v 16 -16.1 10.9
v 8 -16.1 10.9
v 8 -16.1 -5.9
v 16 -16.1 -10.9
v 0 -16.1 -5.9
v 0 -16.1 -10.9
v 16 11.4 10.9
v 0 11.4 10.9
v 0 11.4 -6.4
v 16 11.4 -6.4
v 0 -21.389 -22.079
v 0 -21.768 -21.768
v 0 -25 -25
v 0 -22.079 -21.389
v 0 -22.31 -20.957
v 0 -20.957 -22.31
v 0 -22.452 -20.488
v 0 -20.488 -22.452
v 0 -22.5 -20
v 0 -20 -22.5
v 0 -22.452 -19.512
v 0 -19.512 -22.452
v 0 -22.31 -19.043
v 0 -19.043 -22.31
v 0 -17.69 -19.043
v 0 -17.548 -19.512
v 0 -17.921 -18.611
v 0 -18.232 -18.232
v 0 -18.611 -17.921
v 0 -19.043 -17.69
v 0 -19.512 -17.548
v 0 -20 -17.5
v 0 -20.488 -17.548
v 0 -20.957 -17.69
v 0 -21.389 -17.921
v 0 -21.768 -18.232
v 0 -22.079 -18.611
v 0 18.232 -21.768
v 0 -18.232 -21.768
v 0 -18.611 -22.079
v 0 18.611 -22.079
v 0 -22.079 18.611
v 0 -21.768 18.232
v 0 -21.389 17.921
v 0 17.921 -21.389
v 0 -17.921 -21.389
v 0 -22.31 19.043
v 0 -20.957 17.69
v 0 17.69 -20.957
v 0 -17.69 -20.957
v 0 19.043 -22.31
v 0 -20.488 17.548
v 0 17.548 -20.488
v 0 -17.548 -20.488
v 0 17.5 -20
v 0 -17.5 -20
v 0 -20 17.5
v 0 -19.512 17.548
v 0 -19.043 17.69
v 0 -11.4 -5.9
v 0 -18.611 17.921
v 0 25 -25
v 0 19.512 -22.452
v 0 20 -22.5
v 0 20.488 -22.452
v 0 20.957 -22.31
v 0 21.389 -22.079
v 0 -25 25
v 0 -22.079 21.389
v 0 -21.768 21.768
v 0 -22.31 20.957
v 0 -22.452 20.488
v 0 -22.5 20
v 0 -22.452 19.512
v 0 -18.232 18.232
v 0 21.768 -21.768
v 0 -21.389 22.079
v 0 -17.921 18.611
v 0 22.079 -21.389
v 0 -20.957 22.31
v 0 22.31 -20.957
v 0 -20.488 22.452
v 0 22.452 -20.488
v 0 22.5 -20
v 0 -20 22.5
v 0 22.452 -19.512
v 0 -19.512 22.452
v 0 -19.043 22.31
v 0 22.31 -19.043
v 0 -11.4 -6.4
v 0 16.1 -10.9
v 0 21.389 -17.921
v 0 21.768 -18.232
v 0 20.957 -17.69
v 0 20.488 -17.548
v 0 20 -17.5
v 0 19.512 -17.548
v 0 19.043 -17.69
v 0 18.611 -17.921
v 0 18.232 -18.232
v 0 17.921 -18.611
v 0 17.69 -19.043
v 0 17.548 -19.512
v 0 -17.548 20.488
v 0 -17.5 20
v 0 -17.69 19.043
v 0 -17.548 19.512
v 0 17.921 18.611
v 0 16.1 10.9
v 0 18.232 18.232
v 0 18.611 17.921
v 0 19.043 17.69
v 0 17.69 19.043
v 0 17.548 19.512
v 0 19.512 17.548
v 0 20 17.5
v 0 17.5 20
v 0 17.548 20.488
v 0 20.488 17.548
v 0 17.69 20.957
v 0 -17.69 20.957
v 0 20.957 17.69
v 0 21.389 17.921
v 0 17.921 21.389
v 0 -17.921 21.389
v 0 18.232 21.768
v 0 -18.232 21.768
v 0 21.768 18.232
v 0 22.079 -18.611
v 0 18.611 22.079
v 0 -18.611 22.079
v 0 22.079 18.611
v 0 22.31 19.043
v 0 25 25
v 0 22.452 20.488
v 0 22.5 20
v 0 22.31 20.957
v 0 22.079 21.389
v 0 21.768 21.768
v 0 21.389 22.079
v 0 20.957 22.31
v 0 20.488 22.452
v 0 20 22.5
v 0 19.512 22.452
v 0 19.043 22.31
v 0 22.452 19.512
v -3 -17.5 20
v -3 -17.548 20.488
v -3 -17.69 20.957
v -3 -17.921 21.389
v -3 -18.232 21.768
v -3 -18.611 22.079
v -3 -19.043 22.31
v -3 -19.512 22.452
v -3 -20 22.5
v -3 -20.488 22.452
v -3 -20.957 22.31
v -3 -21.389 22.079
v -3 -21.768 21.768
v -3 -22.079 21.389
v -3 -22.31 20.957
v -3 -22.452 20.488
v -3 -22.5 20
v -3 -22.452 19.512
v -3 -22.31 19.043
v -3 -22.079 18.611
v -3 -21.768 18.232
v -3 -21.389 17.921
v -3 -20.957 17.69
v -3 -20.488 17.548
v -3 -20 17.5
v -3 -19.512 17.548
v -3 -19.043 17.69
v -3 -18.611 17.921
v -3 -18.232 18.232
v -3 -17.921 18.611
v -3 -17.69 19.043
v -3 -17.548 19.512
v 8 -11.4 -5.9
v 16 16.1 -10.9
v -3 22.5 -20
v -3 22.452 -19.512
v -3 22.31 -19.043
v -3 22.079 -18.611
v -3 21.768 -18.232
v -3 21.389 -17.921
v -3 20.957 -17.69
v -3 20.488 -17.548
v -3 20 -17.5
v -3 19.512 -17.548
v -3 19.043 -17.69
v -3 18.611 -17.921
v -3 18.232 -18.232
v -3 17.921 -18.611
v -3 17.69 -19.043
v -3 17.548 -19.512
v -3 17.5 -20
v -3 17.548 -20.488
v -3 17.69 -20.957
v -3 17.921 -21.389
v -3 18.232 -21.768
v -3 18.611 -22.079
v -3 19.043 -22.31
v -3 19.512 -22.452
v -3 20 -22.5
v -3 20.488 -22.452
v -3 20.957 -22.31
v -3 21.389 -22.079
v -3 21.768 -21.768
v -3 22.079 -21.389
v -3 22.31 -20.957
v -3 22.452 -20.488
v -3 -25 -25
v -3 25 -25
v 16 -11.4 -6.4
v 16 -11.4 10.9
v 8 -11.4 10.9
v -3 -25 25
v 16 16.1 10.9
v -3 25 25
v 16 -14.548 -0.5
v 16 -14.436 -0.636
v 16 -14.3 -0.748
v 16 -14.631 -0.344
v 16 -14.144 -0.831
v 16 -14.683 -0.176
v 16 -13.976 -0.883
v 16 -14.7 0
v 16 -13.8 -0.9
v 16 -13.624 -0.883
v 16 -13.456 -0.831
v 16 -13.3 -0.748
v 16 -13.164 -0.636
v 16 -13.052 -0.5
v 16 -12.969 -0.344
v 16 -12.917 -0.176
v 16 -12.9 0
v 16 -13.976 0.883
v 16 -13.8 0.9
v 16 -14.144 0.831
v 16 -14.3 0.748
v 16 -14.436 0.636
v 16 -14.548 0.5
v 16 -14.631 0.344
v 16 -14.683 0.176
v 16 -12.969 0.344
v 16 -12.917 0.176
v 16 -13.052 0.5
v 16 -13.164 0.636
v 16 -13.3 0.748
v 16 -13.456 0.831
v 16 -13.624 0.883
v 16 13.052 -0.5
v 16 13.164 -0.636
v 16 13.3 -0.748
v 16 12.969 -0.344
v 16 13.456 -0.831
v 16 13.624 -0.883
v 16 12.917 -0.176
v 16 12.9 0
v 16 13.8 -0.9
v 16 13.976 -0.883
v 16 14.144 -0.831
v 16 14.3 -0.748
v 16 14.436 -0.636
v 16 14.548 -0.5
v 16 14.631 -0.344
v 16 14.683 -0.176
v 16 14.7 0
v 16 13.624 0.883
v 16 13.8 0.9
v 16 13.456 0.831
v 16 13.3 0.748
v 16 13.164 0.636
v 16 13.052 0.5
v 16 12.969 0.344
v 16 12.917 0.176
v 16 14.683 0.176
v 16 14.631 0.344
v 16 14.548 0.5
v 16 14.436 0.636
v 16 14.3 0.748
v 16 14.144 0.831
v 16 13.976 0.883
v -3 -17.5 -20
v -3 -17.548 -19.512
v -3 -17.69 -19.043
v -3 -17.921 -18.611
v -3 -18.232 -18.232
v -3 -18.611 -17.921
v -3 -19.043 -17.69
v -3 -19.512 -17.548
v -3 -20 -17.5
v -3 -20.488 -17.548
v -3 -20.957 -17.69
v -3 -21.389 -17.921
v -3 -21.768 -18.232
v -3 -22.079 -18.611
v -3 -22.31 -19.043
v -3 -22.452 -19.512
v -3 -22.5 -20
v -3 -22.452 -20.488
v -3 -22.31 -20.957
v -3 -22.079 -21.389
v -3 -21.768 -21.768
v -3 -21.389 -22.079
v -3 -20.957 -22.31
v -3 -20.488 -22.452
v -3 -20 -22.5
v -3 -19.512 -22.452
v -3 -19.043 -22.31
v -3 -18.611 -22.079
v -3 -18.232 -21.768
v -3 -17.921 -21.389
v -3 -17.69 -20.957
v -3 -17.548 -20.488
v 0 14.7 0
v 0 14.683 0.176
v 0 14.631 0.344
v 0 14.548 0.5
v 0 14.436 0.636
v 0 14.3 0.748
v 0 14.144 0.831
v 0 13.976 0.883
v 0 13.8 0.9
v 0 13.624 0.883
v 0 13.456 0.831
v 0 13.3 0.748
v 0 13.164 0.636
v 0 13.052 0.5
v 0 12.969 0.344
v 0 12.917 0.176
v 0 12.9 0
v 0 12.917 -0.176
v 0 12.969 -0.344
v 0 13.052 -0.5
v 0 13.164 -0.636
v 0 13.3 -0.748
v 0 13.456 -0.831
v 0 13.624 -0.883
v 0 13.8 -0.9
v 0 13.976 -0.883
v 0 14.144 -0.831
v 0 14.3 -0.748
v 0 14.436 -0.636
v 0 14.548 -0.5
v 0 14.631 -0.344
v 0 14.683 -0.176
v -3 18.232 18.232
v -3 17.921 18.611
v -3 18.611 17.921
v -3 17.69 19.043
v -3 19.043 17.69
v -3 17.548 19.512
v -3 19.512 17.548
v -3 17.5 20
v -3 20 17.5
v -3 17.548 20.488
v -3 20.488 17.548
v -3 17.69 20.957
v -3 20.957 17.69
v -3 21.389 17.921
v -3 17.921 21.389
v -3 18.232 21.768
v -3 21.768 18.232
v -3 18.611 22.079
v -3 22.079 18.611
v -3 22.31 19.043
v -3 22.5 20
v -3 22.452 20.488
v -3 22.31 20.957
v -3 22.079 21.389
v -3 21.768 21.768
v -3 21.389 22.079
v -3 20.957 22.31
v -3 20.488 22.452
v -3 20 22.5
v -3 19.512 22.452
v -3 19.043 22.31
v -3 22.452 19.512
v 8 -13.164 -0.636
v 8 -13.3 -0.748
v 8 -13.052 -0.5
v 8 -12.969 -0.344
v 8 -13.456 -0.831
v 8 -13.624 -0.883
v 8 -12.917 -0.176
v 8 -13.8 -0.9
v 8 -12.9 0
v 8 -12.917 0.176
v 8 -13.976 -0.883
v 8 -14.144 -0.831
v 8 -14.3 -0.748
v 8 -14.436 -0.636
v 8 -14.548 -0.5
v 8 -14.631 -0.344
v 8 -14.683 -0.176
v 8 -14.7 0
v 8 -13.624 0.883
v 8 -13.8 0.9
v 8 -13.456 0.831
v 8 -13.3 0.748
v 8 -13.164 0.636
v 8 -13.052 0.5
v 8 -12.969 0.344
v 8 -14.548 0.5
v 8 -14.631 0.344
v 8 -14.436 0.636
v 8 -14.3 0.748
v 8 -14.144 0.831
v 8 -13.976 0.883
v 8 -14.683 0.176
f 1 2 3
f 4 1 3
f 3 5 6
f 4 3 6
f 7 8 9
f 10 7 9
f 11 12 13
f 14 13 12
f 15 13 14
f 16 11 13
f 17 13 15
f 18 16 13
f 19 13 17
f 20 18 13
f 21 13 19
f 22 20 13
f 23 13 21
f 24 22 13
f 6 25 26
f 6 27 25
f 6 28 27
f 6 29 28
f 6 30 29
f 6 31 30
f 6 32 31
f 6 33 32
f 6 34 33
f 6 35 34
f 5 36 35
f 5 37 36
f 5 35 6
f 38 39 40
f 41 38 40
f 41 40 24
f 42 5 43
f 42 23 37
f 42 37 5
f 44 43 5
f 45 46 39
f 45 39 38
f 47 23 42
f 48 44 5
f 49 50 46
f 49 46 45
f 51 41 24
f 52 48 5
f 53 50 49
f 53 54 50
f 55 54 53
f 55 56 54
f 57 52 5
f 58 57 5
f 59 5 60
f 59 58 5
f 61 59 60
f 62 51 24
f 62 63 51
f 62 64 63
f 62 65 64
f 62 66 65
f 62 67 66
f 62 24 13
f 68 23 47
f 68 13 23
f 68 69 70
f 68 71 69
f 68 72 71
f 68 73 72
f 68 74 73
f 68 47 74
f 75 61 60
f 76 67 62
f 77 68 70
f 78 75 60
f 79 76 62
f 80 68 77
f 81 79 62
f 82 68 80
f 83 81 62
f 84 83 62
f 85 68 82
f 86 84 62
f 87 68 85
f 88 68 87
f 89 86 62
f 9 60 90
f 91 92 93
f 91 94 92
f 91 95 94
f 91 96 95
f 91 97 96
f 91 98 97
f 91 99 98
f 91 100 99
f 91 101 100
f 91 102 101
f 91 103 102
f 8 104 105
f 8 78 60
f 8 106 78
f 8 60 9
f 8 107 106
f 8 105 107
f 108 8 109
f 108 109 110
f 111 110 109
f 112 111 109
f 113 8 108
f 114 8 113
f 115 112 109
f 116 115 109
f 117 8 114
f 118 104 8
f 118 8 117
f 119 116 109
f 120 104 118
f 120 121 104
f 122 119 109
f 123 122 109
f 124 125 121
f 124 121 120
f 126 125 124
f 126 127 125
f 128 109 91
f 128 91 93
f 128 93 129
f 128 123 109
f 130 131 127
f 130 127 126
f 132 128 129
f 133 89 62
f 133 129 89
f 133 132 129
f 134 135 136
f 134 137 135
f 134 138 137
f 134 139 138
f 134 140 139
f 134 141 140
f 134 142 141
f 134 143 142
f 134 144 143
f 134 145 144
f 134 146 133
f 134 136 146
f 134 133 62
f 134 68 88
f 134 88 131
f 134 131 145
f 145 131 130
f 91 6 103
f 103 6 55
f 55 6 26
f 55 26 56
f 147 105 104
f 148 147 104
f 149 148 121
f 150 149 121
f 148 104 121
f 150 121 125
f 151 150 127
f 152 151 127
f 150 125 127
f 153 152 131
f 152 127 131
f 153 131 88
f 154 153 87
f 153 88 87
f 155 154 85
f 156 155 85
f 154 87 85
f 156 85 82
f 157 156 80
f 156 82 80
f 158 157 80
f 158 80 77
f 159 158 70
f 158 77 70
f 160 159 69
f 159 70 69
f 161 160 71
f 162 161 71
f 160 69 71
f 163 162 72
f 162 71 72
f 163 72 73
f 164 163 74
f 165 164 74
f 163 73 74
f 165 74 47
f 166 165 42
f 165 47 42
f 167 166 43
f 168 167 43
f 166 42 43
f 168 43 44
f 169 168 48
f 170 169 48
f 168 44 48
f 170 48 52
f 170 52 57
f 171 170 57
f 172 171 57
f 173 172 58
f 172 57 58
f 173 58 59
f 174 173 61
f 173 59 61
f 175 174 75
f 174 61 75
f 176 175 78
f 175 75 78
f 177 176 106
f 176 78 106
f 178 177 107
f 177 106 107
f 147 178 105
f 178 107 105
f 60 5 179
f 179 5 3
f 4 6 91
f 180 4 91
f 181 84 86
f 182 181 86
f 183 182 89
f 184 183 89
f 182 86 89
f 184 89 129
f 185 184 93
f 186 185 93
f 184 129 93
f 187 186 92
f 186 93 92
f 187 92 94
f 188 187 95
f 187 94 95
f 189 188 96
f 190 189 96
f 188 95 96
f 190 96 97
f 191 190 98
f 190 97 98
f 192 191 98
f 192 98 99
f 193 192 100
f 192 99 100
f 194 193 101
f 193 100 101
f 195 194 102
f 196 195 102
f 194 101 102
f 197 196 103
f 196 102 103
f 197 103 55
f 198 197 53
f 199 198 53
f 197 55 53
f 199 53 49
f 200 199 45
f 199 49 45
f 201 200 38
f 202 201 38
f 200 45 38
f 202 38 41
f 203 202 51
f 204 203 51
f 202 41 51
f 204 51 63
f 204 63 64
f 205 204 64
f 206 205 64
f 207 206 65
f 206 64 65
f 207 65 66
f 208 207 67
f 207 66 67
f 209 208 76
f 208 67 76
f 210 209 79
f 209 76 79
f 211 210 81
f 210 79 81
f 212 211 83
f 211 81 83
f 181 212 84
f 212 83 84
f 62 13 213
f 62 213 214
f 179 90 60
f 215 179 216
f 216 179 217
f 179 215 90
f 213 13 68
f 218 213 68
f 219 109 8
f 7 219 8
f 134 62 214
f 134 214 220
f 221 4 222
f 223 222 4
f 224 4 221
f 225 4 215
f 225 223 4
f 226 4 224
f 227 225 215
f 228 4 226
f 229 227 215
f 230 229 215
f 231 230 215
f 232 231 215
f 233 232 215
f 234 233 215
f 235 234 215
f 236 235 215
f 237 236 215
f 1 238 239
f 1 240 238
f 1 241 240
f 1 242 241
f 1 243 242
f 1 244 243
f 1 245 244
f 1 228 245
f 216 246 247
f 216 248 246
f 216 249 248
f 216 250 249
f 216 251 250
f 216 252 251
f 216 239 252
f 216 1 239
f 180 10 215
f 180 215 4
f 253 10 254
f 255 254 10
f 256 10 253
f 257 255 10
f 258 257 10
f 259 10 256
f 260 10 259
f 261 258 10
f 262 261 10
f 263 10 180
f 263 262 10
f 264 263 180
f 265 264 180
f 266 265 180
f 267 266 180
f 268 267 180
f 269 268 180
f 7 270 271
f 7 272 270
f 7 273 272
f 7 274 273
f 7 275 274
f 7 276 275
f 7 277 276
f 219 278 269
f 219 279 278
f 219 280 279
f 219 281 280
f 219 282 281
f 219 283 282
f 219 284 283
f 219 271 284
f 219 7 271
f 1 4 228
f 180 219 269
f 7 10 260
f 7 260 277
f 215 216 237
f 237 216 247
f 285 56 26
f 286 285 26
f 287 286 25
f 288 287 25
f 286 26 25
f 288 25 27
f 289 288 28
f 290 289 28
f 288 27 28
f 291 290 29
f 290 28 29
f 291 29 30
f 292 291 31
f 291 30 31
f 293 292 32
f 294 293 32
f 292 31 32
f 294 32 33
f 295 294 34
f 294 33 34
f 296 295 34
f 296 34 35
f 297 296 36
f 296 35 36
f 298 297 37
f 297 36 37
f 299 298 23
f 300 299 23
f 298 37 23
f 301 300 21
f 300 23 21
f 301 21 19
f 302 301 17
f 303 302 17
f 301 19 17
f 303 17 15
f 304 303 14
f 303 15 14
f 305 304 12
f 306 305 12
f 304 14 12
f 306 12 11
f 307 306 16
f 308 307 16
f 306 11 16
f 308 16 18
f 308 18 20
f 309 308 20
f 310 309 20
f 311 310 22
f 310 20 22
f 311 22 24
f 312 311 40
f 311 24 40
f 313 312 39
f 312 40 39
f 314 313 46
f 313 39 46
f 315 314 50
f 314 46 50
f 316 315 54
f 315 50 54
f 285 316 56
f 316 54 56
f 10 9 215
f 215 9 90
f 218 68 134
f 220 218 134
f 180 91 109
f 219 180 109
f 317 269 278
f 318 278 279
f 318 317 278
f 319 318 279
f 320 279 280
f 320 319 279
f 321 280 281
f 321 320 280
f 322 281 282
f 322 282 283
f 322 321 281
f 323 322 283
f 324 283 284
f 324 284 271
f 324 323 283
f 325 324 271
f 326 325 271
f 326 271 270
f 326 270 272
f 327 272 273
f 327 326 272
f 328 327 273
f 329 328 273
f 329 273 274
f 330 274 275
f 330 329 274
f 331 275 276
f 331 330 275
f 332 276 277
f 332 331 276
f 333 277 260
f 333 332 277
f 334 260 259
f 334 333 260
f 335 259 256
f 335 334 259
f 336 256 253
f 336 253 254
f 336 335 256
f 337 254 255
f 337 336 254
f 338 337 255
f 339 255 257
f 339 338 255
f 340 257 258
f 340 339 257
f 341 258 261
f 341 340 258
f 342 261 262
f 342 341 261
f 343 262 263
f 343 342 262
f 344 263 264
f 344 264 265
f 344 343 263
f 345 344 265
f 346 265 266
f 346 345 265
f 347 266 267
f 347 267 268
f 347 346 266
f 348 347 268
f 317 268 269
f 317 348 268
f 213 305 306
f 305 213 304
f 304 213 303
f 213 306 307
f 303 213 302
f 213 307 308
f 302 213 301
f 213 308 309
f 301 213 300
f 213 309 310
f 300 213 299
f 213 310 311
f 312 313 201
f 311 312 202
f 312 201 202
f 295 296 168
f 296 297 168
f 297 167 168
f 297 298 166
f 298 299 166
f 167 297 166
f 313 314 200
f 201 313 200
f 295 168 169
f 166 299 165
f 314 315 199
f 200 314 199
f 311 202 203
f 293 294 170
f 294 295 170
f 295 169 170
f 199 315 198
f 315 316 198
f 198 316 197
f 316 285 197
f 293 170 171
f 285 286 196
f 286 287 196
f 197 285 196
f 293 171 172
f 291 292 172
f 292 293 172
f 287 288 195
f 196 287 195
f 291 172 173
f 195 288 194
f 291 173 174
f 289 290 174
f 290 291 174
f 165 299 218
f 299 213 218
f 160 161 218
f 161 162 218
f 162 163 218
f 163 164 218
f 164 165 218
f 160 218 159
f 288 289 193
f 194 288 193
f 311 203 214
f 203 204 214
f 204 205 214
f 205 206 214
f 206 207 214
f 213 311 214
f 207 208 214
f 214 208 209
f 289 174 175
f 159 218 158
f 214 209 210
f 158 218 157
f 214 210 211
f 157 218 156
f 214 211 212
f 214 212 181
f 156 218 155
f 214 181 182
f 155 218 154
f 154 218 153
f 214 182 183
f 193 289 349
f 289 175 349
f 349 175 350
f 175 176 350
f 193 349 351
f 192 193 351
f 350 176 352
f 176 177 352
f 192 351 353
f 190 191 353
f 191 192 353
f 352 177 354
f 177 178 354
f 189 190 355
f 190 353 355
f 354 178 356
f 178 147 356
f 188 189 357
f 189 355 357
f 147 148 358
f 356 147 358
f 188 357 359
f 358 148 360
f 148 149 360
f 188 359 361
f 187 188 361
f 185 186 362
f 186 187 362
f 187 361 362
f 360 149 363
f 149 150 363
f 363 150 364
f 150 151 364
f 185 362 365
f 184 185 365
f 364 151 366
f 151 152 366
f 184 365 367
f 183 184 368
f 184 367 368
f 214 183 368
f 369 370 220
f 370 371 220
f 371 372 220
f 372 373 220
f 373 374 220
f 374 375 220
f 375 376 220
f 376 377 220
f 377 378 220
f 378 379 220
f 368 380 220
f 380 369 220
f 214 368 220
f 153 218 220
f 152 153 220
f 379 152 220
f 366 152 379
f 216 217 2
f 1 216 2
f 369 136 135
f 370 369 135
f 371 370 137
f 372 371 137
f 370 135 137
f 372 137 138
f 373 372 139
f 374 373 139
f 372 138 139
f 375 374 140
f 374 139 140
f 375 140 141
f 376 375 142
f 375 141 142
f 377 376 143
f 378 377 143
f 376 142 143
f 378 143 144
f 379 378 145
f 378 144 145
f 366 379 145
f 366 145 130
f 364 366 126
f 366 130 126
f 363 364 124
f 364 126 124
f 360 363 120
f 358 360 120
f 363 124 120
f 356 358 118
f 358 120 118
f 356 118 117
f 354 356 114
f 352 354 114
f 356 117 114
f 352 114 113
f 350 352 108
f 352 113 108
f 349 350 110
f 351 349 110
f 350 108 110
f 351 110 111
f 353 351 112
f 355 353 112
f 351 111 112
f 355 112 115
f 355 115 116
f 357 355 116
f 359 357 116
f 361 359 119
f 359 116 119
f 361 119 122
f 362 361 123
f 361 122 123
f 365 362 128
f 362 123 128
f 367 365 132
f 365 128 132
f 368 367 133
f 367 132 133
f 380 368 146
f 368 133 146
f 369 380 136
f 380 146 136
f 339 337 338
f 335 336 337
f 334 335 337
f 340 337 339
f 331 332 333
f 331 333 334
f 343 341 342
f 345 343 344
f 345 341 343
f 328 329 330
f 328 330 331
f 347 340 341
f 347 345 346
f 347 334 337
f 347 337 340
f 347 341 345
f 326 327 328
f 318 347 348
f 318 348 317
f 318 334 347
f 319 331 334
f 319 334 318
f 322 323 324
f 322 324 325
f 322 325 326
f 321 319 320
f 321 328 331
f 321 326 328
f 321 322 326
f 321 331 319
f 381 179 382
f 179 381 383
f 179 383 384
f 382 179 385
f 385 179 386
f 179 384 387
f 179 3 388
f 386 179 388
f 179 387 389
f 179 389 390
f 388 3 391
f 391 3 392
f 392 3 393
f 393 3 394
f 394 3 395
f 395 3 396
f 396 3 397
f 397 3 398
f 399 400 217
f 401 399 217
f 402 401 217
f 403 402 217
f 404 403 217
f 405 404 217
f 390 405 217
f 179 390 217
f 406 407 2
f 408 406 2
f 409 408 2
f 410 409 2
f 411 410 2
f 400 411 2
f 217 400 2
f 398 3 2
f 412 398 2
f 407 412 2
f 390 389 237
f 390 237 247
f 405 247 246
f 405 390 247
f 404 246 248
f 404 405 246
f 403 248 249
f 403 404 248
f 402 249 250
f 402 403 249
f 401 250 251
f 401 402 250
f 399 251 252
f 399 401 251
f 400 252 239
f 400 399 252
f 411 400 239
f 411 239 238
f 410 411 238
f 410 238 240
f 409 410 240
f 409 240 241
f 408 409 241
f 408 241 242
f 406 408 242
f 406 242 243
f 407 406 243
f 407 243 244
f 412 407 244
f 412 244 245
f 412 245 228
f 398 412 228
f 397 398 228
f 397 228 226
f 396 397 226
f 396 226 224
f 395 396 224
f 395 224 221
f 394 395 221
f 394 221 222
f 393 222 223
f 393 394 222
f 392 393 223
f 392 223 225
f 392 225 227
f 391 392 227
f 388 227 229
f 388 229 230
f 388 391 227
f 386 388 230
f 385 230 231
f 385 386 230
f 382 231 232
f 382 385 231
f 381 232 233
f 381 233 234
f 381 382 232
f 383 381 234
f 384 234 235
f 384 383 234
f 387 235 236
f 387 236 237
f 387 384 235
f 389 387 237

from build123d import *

# Parameters (mm, degrees)
F0_R     = 0.9
F1_DEPTH = 16
F2_W     = 8
F2_H     = 16.8
F3_DEPTH = 5
F4_W     = 50
F4_H     = 50
F4_R     = 2.5
F5_DEPTH = 3


with BuildPart() as f1:
    # F0 (on Right) → F1 (new body)
    with BuildSketch(Plane.YZ):
        Polygon((-16.1, 10.9), (-16.1, 5.9), (-16.1, -5.9), (-16.1, -10.9), (16.1, -10.9), (16.1, -5.9), (16.1, 5.9), (16.1, 10.9), (11.4, 10.9), (11.4, 5.9), (11.4, -5.9), (11.4, -6.4), (-11.4, -6.4), (-11.4, -5.9), (-11.4, 5.9), (-11.4, 10.9), align=None)
        with Locations((-13.8, 0)):
            Circle(F0_R, mode=Mode.SUBTRACT)
        with Locations((13.8, 0)):
            Circle(F0_R, mode=Mode.SUBTRACT)
    extrude(amount=F1_DEPTH)

    # F2 (on face) → F3 (cut)
    with BuildSketch(Plane.XZ.offset(16.1)):
        with Locations((4, 2.5)):
            Rectangle(F2_W, F2_H)
    extrude(amount=-F3_DEPTH, mode=Mode.SUBTRACT)

    # F4 (on face) → F5 (join)
    with BuildSketch(Plane.YZ):
        Rectangle(F4_W, F4_H)
        with Locations((-20, -20)):
            Circle(F4_R, mode=Mode.SUBTRACT)
        with Locations((20, -20)):
            Circle(F4_R, mode=Mode.SUBTRACT)
        with Locations((-20, 20)):
            Circle(F4_R, mode=Mode.SUBTRACT)
        with Locations((20, 20)):
            Circle(F4_R, mode=Mode.SUBTRACT)
    extrude(amount=-F5_DEPTH)


solid = f1.part
